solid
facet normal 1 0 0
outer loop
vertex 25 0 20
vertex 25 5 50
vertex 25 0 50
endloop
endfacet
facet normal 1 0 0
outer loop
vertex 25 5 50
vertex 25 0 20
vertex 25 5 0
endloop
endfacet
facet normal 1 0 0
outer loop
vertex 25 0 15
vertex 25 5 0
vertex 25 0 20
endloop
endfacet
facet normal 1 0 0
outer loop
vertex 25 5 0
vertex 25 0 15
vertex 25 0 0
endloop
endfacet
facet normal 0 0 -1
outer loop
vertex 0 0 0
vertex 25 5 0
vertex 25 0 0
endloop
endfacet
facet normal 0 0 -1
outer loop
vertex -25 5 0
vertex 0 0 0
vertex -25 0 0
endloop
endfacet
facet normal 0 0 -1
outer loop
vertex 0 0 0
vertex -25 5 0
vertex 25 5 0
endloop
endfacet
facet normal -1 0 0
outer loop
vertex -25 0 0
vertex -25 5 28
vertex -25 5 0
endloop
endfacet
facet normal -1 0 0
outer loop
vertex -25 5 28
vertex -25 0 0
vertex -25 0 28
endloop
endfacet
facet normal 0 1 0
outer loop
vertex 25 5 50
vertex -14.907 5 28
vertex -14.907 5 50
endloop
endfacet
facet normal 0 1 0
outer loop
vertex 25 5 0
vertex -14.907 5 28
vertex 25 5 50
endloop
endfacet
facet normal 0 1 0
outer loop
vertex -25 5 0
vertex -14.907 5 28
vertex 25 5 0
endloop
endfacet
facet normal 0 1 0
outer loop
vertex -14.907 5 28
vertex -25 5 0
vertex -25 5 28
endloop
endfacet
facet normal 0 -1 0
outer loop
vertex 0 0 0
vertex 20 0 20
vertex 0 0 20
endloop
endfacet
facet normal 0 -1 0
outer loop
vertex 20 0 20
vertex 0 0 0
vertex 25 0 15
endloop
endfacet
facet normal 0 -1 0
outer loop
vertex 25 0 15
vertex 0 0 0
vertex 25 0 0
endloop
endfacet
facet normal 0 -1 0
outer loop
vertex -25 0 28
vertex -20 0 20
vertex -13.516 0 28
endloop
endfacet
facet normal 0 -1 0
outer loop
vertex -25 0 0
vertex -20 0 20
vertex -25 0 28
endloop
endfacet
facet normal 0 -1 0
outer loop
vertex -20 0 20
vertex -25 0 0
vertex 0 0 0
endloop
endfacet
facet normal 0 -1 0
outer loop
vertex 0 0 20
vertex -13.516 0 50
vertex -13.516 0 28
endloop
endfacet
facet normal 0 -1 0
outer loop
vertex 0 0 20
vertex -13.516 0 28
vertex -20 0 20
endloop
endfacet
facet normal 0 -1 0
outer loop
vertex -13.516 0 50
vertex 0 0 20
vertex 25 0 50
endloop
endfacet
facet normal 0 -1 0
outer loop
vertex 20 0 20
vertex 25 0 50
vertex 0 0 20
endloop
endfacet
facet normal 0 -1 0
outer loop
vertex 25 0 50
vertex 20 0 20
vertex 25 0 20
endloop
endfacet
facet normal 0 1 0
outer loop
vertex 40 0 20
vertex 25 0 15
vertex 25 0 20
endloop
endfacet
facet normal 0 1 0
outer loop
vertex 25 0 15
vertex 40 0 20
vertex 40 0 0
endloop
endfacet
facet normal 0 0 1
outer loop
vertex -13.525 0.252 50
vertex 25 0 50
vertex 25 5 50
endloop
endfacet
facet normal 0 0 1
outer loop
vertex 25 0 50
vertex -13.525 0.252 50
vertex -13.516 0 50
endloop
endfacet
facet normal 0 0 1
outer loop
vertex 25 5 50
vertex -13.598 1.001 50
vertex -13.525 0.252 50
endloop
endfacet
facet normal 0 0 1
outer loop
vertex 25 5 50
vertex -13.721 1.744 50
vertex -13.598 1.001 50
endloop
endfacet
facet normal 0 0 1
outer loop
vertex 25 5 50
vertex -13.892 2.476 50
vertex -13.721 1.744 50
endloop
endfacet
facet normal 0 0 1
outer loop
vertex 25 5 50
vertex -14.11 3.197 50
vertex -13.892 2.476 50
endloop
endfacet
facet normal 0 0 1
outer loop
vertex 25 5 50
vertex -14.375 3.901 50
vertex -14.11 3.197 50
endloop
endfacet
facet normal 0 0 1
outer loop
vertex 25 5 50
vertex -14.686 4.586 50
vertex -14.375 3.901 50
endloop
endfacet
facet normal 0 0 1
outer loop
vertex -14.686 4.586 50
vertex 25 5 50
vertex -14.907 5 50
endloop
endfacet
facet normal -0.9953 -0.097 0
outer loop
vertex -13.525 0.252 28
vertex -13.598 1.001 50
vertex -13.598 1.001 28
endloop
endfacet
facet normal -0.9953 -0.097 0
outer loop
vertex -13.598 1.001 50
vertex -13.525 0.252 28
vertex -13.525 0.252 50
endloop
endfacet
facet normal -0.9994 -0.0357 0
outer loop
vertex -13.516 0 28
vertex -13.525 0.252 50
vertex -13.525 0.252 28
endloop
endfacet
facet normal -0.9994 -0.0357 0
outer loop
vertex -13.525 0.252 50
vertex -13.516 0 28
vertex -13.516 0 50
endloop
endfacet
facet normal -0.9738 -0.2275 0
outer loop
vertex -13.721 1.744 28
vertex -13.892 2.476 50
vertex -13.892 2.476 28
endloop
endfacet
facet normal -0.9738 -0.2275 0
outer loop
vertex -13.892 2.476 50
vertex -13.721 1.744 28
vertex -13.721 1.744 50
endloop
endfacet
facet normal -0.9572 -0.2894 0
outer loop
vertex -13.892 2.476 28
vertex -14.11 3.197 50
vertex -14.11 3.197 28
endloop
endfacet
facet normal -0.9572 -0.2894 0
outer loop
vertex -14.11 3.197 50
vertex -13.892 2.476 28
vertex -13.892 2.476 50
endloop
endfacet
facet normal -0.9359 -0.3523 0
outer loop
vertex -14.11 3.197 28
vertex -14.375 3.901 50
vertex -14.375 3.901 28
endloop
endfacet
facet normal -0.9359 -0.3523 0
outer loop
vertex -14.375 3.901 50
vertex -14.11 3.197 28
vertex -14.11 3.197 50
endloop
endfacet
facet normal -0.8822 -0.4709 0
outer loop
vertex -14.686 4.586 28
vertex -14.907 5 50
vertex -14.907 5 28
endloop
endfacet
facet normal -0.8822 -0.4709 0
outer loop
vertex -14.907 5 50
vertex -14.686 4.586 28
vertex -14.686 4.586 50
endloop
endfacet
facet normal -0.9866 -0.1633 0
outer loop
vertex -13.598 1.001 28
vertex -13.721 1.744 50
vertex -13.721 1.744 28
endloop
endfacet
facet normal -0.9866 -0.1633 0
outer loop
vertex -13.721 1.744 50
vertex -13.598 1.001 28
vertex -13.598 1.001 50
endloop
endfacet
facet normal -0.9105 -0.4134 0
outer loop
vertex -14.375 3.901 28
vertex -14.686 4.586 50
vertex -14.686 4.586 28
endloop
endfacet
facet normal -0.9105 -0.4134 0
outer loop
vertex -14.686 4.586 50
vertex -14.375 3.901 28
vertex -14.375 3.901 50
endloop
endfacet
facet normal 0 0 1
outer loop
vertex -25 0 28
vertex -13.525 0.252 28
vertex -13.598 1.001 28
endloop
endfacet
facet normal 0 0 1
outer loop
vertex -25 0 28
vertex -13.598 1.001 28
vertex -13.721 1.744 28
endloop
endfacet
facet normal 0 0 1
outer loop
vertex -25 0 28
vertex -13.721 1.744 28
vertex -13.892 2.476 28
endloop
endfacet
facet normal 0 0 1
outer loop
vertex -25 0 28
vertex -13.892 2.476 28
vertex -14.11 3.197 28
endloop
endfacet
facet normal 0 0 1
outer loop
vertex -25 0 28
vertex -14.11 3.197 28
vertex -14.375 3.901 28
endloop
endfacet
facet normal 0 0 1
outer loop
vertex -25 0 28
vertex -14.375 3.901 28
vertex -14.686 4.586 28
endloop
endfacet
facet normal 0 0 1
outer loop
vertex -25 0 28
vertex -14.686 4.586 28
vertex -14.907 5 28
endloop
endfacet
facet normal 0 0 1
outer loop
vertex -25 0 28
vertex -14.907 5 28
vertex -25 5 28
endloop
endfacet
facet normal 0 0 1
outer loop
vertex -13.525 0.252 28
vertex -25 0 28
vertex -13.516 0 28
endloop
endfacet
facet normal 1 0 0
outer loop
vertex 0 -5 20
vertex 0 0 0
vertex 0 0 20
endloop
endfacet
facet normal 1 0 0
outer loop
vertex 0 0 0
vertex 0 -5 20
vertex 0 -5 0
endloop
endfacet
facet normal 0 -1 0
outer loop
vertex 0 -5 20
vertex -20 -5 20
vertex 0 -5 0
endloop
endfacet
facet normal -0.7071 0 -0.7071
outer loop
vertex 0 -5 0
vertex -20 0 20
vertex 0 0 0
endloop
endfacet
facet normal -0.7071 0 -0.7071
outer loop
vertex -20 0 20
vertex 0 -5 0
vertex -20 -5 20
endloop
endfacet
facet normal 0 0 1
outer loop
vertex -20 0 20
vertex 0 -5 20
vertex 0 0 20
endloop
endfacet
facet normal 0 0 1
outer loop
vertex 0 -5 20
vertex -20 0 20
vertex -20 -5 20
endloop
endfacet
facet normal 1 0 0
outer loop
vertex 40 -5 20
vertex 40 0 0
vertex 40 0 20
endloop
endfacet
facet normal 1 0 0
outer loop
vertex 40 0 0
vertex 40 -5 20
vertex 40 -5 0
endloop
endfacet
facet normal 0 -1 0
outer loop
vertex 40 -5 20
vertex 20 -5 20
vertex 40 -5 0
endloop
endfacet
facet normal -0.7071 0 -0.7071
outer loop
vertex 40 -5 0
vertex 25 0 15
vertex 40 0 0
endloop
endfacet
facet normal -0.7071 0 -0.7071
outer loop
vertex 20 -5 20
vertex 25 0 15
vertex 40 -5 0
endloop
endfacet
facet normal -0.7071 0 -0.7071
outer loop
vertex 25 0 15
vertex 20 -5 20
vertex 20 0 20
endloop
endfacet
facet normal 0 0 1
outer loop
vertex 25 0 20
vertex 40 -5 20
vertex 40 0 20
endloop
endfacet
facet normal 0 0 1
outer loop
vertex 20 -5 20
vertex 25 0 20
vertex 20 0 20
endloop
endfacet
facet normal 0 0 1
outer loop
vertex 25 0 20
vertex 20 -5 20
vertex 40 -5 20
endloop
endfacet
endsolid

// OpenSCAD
// L-shaped mounting bracket for NEMA 17 stepper motor (syringe pump)
// Print orientation: base plate on bed, vertical plate builds upward (+Z)

// ---------------- Parameters ----------------
plate_w      = 50;    // base plate length (X), also motor plate width (Y)
plate_h      = 5;     // base plate thickness (Z)
motor_h      = 50;    // vertical motor plate height (Z)
hole_m4      = 4.5;   // M4 through-holes in base plate
hole_m4_x    = 17;    // M4 hole X offset from centre (+/-)
hole_m4_y    = 30;    // M4 hole Y position
boss_d       = 23;    // motor centring boss hole diameter
boss_x       = 0;     // boss hole X centre
boss_z       = 28;    // boss hole Z centre
screw_d      = 3.4;   // M3 screw holes in motor plate
screw_nx     = 4;     // number of screw holes along X
screw_ny     = 4;     // number of screw holes along Y
screw_pitch  = 31;    // square pattern side length
gusset_t     = 5;     // triangular gusset thickness (X)
gusset_leg   = 20;    // gusset leg length along +Y and +Z
eps          = 0.5;   // cutter overshoot past faces

$fn = 96;

// ---------------- Model ----------------
union() {
    // Base plate with M4 through-holes
    difference() {
        translate([-plate_w/2, 0, 0])
            cube([plate_w, plate_h, 10]);
        for (sx = [-1, 1])
            translate([sx * hole_m4_x, hole_m4_y, -eps])
                cylinder(d = hole_m4, h = plate_h + 2*eps);
    }

    // Vertical motor plate with boss hole and M3 screw holes
    translate([-plate_w/2, 0, 0])
        difference() {
            cube([plate_w, plate_h, motor_h]);
            // Boss hole along Y
            translate([boss_x, -eps, boss_z])
                cylinder(d = boss_d, h = plate_w + 2*eps);
            // M3 screw holes on square pattern
            for (i = [0 : screw_nx - 1])
                for (j = [0 : screw_ny - 1])
                    translate([(i - (screw_nx - 1)/2) * screw_pitch,
                               (j - (screw_ny - 1)/2) * screw_pitch,
                               -eps])
                        cylinder(d = screw_d, h = motor_h + 2*eps);
        }

    // Triangular gussets, flush with left and right edges
    for (x0 = [-plate_w/2 + gusset_t, plate_w/2 - gusset_t])
        translate([x0, 0, 0])
            rotate([90, 0, 0])
                linear_extrude(height = gusset_t)
                    polygon(points = [
                        [gusset_leg, gusset_leg],
                        [gusset_leg, 0],
                        [0, gusset_leg]
                    ]);
}
